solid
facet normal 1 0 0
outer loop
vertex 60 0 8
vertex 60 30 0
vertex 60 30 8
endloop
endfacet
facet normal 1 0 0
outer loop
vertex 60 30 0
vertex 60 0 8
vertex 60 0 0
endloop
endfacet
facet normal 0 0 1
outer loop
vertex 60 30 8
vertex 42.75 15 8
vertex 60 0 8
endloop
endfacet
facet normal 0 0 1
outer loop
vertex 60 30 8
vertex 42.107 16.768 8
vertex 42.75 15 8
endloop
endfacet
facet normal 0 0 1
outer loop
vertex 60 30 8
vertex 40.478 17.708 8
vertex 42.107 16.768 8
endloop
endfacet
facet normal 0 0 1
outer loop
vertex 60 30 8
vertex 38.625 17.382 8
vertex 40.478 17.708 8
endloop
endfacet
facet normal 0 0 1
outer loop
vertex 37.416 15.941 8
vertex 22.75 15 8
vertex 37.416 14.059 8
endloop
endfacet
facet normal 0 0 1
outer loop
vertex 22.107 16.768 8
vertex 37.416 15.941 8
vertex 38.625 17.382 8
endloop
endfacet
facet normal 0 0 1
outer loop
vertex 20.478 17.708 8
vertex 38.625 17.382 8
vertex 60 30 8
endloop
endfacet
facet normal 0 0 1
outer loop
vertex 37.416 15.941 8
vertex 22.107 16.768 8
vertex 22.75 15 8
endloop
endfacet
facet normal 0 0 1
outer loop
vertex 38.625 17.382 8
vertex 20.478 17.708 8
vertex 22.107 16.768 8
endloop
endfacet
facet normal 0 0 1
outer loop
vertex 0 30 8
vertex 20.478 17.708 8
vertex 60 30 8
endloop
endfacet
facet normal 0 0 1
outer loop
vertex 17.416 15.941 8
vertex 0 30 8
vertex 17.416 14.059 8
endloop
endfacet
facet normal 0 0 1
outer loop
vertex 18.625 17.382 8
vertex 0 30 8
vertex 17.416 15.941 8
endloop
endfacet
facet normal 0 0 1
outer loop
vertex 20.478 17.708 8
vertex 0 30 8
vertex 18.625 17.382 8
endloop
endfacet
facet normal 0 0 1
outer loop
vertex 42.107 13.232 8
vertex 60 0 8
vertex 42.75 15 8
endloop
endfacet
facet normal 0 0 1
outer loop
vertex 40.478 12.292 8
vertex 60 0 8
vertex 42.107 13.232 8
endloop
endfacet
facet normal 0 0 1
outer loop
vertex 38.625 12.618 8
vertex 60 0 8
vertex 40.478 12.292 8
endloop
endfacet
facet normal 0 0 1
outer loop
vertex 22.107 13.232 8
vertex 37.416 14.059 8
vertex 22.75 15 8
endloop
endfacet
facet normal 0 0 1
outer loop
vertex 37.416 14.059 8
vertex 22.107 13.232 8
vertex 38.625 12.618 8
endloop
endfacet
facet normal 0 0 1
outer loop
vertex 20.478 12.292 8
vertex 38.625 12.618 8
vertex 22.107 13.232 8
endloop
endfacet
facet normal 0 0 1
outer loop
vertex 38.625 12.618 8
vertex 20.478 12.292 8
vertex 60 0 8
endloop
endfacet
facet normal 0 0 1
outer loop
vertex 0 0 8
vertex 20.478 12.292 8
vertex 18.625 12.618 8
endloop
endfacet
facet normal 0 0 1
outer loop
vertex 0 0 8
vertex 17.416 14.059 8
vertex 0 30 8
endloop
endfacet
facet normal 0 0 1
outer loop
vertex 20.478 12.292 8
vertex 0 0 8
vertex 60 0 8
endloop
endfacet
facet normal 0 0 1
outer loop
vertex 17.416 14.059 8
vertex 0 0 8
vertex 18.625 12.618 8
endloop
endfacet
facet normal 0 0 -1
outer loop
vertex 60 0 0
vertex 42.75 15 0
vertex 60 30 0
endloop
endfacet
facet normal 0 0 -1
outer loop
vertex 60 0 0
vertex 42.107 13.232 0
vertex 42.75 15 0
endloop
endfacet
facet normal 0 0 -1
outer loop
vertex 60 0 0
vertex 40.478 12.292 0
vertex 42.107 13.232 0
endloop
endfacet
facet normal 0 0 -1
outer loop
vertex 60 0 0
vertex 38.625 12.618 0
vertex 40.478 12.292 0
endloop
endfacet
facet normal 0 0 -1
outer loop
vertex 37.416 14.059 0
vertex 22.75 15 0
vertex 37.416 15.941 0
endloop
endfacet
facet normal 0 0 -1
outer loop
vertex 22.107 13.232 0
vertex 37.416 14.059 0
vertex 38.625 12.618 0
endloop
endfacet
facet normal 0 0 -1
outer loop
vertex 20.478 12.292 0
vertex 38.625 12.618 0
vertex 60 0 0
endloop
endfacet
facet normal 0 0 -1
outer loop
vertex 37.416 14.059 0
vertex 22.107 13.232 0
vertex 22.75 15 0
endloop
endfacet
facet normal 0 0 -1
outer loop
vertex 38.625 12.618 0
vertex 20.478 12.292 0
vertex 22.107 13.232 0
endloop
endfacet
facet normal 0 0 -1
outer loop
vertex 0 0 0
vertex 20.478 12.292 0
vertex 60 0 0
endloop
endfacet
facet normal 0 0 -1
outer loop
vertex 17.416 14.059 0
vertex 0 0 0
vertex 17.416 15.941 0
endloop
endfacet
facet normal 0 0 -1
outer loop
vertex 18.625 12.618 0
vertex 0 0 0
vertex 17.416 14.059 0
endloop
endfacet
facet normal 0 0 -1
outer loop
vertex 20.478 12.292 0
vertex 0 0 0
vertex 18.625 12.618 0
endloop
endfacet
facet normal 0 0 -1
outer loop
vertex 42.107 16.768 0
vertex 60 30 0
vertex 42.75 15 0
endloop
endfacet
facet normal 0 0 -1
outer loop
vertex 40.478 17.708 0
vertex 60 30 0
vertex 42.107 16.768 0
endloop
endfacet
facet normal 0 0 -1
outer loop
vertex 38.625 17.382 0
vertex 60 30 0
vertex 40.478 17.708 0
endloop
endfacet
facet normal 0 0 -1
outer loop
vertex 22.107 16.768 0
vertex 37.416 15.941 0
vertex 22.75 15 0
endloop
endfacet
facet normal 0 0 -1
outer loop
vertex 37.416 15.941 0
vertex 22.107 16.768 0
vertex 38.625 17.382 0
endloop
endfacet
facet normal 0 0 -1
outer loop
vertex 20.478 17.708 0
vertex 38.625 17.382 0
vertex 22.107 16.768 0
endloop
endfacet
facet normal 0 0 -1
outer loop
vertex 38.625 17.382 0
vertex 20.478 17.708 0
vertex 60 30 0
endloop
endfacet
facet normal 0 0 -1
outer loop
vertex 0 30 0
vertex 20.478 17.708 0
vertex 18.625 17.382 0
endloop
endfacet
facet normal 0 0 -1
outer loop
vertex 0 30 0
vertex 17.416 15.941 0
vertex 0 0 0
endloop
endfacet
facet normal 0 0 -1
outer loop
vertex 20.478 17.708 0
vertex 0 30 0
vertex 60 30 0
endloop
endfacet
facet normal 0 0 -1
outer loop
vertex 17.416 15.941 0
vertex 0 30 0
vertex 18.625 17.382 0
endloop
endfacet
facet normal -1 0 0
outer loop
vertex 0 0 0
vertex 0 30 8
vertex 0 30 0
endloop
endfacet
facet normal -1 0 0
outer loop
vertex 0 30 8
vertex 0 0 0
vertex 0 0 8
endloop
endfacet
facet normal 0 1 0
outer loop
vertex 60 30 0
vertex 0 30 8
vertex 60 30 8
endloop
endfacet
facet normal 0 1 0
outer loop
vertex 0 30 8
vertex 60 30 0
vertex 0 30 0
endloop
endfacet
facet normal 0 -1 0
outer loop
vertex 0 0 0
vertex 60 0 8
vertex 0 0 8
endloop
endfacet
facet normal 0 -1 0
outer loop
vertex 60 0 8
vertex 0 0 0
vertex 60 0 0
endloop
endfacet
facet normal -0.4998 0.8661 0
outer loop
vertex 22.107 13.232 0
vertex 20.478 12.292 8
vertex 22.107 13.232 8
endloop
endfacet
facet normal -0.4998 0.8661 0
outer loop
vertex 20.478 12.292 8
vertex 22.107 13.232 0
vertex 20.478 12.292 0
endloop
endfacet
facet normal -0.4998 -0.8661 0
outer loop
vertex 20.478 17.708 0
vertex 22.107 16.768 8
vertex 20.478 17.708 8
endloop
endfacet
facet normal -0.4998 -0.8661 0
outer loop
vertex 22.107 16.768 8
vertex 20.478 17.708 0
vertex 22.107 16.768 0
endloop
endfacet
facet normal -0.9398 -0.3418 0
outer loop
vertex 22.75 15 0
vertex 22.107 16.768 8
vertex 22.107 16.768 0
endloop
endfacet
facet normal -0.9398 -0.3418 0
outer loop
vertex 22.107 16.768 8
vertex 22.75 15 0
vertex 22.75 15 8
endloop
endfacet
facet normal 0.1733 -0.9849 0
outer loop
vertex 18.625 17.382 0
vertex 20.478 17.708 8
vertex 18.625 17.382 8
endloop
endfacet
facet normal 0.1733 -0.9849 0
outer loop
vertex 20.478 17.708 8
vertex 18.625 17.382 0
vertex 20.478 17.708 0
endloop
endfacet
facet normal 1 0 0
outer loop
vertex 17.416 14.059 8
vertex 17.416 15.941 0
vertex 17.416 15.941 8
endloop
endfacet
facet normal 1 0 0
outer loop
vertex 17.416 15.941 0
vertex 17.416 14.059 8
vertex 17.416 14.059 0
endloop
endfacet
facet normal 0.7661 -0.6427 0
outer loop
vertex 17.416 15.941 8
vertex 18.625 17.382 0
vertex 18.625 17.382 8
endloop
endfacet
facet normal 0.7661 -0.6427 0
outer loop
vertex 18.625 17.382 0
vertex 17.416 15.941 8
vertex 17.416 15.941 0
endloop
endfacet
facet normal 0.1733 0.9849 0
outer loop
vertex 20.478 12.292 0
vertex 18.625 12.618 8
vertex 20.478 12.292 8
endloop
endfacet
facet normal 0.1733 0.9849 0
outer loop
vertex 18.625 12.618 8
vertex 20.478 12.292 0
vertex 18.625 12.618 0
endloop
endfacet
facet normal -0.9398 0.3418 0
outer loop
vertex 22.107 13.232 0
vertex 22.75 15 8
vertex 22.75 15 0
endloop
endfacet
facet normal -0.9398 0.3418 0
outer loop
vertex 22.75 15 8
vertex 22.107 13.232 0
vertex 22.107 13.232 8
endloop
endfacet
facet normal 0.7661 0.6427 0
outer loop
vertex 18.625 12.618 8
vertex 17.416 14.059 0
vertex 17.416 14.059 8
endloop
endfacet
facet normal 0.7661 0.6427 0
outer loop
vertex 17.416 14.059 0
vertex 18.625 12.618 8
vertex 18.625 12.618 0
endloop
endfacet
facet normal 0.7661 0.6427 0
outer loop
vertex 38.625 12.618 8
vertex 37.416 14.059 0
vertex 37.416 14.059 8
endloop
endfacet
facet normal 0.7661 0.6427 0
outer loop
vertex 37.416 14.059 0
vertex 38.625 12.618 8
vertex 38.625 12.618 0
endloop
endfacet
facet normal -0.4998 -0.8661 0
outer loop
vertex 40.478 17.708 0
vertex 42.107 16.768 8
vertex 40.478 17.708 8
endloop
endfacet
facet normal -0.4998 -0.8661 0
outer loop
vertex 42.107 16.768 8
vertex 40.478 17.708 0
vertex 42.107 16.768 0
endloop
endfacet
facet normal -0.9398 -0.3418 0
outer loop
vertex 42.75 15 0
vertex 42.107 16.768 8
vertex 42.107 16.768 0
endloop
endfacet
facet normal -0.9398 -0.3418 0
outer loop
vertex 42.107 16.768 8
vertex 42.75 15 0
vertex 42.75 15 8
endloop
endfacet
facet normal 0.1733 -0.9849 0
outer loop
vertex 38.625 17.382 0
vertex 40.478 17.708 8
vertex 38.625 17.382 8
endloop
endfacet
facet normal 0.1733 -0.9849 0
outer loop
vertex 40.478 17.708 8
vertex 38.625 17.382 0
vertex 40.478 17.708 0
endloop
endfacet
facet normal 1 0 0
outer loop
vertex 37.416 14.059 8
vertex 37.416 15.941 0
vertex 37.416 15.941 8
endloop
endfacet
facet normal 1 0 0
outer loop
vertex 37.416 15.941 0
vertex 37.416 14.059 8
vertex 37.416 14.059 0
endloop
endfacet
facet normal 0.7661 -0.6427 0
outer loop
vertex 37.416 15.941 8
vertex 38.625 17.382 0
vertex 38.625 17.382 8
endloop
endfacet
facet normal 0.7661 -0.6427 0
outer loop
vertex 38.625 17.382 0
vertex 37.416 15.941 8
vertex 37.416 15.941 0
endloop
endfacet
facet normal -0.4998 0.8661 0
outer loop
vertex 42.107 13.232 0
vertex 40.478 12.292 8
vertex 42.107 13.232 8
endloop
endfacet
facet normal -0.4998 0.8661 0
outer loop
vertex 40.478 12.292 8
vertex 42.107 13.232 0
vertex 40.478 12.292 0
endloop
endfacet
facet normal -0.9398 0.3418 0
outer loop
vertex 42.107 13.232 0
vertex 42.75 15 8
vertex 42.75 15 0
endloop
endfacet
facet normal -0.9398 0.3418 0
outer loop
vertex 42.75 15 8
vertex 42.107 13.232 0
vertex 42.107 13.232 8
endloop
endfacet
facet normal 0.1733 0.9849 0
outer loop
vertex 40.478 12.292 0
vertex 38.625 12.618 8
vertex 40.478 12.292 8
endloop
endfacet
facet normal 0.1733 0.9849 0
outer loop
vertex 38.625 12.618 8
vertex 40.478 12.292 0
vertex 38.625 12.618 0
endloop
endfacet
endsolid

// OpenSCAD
// file: ../lib/hardware.scad
//placeholder stuff
function bolt_clearance(hw) =
    hw == "M4" ? 4.5 :
    hw == "M5" ? 5.5 :
    hw == "M6" ? 6.6 : undef;

function nut_flat(hw) =
    hw == "M4" ? 7.0 :
    hw == "M5" ? 8.0 :
    hw == "M6" ? 10.0 : undef;
// file: ../config.scad
//placeholder stuff
grid = 10;
hardware = "M5";
extrusion = "2020";
clearance_loose = 0.35;
clearance_tight = 0.15;
wall = 4;

max_print_width = 320;
max_print_depth = 320;
// main file
include <../config.scad>
use <../lib/hardware.scad>

module test() {
  hole_d = bolt_clearance(hardware);
  difference() {
    cube([grid * 6, grid * 3, wall * 2]);
    translate([grid * 2, grid * 1.5, -1])
      cylinder(h=wall * 2 + 2, d=hole_d);
    translate([grid * 4, grid * 1.5, -1])
      cylinder(h=wall * 2 + 2, d=hole_d);
  }
}

test();
